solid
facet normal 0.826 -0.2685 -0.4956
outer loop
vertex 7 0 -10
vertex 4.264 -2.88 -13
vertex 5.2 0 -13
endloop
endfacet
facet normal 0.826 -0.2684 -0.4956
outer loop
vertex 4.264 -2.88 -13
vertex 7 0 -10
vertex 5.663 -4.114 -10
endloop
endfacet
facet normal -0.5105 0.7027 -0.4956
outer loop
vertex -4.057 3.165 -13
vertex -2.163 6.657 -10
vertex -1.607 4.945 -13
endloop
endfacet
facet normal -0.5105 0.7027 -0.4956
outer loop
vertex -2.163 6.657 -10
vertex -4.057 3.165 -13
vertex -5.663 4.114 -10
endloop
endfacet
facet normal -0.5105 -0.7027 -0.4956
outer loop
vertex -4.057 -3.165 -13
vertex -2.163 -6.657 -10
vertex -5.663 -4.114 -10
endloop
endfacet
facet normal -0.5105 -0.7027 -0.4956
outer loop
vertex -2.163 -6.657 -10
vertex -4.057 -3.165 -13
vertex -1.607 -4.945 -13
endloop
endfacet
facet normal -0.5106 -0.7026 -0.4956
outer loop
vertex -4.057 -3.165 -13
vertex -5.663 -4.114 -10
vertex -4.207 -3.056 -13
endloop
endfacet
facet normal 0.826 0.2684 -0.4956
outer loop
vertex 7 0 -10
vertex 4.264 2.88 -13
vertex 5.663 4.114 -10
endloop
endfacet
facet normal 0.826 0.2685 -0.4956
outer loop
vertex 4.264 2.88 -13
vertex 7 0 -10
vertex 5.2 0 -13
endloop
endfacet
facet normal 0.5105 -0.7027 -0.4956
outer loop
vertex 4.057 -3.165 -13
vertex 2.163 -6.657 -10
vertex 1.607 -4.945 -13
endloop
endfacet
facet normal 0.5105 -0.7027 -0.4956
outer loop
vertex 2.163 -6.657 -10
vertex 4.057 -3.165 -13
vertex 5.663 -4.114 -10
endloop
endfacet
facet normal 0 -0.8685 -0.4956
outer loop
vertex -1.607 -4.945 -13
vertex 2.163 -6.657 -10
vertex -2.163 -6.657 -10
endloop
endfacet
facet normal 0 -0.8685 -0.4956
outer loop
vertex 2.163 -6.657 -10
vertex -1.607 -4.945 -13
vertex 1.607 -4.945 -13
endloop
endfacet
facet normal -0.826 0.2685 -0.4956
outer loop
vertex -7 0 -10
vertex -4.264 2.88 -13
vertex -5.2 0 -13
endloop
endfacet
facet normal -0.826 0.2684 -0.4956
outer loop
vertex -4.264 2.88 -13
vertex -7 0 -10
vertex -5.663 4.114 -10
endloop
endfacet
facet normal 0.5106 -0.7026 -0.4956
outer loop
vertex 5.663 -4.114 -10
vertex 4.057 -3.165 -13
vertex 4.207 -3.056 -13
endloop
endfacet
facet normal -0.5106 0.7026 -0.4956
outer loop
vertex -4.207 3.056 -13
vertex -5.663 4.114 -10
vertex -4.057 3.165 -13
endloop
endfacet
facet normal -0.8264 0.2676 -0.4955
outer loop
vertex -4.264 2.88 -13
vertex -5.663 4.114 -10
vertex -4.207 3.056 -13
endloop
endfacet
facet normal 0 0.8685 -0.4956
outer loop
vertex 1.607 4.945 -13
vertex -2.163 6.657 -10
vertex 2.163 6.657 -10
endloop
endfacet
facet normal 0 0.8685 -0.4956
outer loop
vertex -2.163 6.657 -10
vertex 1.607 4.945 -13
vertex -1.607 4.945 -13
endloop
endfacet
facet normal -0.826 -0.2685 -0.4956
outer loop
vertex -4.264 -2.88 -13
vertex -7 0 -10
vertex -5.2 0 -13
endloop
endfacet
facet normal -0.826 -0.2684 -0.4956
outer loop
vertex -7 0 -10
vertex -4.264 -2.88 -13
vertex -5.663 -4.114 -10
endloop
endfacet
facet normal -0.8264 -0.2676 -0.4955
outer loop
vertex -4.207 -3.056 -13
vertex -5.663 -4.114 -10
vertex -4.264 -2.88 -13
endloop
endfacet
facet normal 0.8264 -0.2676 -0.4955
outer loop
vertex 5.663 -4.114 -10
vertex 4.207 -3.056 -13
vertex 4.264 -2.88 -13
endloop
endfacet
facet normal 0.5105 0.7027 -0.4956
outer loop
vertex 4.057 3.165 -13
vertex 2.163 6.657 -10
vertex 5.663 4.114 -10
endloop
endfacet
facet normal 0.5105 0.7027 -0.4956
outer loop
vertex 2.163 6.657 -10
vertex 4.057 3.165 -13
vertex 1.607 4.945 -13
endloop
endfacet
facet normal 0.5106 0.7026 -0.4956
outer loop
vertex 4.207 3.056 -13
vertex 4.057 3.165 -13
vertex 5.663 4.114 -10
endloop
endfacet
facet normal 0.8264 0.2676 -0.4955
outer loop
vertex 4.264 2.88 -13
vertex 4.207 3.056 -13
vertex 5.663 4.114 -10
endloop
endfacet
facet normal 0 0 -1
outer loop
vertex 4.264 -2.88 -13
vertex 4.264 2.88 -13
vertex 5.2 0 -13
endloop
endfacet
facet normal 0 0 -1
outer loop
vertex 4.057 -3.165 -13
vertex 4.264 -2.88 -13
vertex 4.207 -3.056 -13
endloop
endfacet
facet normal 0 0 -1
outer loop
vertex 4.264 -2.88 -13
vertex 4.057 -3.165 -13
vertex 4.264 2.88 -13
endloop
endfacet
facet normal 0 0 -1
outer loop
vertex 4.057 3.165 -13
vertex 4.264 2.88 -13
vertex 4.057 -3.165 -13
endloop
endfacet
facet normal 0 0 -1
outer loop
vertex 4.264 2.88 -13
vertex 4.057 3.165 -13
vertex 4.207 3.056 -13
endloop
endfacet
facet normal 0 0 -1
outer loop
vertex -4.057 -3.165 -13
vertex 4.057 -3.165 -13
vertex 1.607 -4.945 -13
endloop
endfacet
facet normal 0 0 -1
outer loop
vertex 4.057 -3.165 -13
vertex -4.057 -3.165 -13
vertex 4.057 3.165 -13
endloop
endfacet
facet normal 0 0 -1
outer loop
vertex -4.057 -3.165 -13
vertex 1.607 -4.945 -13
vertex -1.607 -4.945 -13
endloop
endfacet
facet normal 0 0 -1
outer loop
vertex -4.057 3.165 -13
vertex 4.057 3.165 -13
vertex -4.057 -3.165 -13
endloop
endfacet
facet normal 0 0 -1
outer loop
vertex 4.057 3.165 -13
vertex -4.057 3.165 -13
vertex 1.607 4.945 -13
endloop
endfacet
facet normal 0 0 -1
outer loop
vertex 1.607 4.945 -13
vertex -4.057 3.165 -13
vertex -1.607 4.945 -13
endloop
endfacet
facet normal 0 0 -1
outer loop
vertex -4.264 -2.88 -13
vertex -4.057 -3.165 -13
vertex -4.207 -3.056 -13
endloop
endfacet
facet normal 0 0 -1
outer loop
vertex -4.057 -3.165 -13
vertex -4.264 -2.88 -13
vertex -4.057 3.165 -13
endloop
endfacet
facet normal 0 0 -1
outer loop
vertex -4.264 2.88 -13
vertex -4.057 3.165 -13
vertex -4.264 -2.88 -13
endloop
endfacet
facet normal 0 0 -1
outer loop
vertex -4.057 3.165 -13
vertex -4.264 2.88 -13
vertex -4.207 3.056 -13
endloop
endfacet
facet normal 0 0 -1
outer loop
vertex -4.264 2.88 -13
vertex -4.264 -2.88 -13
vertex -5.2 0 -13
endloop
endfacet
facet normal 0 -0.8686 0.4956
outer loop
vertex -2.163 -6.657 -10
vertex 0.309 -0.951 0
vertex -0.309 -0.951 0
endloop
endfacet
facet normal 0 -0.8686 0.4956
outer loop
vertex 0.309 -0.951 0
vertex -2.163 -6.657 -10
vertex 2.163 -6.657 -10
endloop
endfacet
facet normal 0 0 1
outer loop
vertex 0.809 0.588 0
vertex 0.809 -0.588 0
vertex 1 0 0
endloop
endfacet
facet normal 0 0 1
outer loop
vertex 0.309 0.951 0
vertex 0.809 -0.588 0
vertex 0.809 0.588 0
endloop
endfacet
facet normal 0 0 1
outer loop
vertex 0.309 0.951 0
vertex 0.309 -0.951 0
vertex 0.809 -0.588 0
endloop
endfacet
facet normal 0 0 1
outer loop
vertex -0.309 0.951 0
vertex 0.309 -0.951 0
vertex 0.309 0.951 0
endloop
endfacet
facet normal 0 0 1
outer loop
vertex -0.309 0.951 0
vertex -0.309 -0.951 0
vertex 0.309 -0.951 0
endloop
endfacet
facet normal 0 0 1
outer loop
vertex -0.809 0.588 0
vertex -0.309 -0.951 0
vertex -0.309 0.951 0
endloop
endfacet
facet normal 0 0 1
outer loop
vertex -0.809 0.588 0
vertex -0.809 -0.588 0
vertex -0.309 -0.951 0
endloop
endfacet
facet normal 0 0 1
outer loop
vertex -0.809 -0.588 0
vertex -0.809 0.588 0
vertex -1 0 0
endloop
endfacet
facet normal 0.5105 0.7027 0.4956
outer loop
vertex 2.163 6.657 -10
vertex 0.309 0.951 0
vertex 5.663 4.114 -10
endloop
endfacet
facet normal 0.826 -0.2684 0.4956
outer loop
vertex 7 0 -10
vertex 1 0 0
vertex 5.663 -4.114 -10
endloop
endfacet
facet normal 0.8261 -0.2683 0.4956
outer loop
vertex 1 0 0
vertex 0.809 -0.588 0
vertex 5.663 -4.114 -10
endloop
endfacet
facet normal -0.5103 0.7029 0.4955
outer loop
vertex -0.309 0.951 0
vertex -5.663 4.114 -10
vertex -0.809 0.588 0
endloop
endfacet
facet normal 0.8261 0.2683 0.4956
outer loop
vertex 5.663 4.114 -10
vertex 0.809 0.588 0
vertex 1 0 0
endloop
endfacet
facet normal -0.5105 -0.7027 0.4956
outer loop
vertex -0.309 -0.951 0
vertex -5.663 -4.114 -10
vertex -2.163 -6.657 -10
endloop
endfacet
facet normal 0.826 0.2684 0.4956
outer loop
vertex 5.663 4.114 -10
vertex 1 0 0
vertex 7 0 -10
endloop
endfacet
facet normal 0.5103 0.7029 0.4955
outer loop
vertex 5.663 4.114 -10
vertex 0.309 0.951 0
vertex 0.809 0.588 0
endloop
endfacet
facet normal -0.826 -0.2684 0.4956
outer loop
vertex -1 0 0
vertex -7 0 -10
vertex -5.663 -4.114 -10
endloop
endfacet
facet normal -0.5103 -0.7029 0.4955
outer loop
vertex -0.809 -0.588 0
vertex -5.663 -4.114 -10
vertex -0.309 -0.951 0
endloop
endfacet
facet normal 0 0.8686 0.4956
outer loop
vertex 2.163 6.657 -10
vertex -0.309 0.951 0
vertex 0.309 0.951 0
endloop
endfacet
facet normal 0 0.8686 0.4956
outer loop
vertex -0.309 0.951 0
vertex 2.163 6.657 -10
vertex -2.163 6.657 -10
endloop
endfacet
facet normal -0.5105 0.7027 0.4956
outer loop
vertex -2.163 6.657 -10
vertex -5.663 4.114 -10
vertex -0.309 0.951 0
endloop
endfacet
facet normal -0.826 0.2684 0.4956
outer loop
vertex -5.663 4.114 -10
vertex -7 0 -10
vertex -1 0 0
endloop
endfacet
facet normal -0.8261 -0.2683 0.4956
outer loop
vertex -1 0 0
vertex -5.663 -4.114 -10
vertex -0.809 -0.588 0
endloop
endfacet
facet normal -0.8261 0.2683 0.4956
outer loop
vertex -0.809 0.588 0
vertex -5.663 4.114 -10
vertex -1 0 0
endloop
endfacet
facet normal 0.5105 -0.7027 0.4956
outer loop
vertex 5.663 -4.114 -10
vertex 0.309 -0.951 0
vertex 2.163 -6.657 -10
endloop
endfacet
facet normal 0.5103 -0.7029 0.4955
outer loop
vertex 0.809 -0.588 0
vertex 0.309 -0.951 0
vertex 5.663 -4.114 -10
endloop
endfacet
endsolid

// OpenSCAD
$fn=10;
rotate ([180,0,0]) {
	union() {
		color ([0,1,10]) {
			cylinder (10,1,7);
			difference () {
			translate ([0,0,10])cylinder (10,7,1);
			translate ([-6,-6,13])cube (12);
		}
	}
  }
}
